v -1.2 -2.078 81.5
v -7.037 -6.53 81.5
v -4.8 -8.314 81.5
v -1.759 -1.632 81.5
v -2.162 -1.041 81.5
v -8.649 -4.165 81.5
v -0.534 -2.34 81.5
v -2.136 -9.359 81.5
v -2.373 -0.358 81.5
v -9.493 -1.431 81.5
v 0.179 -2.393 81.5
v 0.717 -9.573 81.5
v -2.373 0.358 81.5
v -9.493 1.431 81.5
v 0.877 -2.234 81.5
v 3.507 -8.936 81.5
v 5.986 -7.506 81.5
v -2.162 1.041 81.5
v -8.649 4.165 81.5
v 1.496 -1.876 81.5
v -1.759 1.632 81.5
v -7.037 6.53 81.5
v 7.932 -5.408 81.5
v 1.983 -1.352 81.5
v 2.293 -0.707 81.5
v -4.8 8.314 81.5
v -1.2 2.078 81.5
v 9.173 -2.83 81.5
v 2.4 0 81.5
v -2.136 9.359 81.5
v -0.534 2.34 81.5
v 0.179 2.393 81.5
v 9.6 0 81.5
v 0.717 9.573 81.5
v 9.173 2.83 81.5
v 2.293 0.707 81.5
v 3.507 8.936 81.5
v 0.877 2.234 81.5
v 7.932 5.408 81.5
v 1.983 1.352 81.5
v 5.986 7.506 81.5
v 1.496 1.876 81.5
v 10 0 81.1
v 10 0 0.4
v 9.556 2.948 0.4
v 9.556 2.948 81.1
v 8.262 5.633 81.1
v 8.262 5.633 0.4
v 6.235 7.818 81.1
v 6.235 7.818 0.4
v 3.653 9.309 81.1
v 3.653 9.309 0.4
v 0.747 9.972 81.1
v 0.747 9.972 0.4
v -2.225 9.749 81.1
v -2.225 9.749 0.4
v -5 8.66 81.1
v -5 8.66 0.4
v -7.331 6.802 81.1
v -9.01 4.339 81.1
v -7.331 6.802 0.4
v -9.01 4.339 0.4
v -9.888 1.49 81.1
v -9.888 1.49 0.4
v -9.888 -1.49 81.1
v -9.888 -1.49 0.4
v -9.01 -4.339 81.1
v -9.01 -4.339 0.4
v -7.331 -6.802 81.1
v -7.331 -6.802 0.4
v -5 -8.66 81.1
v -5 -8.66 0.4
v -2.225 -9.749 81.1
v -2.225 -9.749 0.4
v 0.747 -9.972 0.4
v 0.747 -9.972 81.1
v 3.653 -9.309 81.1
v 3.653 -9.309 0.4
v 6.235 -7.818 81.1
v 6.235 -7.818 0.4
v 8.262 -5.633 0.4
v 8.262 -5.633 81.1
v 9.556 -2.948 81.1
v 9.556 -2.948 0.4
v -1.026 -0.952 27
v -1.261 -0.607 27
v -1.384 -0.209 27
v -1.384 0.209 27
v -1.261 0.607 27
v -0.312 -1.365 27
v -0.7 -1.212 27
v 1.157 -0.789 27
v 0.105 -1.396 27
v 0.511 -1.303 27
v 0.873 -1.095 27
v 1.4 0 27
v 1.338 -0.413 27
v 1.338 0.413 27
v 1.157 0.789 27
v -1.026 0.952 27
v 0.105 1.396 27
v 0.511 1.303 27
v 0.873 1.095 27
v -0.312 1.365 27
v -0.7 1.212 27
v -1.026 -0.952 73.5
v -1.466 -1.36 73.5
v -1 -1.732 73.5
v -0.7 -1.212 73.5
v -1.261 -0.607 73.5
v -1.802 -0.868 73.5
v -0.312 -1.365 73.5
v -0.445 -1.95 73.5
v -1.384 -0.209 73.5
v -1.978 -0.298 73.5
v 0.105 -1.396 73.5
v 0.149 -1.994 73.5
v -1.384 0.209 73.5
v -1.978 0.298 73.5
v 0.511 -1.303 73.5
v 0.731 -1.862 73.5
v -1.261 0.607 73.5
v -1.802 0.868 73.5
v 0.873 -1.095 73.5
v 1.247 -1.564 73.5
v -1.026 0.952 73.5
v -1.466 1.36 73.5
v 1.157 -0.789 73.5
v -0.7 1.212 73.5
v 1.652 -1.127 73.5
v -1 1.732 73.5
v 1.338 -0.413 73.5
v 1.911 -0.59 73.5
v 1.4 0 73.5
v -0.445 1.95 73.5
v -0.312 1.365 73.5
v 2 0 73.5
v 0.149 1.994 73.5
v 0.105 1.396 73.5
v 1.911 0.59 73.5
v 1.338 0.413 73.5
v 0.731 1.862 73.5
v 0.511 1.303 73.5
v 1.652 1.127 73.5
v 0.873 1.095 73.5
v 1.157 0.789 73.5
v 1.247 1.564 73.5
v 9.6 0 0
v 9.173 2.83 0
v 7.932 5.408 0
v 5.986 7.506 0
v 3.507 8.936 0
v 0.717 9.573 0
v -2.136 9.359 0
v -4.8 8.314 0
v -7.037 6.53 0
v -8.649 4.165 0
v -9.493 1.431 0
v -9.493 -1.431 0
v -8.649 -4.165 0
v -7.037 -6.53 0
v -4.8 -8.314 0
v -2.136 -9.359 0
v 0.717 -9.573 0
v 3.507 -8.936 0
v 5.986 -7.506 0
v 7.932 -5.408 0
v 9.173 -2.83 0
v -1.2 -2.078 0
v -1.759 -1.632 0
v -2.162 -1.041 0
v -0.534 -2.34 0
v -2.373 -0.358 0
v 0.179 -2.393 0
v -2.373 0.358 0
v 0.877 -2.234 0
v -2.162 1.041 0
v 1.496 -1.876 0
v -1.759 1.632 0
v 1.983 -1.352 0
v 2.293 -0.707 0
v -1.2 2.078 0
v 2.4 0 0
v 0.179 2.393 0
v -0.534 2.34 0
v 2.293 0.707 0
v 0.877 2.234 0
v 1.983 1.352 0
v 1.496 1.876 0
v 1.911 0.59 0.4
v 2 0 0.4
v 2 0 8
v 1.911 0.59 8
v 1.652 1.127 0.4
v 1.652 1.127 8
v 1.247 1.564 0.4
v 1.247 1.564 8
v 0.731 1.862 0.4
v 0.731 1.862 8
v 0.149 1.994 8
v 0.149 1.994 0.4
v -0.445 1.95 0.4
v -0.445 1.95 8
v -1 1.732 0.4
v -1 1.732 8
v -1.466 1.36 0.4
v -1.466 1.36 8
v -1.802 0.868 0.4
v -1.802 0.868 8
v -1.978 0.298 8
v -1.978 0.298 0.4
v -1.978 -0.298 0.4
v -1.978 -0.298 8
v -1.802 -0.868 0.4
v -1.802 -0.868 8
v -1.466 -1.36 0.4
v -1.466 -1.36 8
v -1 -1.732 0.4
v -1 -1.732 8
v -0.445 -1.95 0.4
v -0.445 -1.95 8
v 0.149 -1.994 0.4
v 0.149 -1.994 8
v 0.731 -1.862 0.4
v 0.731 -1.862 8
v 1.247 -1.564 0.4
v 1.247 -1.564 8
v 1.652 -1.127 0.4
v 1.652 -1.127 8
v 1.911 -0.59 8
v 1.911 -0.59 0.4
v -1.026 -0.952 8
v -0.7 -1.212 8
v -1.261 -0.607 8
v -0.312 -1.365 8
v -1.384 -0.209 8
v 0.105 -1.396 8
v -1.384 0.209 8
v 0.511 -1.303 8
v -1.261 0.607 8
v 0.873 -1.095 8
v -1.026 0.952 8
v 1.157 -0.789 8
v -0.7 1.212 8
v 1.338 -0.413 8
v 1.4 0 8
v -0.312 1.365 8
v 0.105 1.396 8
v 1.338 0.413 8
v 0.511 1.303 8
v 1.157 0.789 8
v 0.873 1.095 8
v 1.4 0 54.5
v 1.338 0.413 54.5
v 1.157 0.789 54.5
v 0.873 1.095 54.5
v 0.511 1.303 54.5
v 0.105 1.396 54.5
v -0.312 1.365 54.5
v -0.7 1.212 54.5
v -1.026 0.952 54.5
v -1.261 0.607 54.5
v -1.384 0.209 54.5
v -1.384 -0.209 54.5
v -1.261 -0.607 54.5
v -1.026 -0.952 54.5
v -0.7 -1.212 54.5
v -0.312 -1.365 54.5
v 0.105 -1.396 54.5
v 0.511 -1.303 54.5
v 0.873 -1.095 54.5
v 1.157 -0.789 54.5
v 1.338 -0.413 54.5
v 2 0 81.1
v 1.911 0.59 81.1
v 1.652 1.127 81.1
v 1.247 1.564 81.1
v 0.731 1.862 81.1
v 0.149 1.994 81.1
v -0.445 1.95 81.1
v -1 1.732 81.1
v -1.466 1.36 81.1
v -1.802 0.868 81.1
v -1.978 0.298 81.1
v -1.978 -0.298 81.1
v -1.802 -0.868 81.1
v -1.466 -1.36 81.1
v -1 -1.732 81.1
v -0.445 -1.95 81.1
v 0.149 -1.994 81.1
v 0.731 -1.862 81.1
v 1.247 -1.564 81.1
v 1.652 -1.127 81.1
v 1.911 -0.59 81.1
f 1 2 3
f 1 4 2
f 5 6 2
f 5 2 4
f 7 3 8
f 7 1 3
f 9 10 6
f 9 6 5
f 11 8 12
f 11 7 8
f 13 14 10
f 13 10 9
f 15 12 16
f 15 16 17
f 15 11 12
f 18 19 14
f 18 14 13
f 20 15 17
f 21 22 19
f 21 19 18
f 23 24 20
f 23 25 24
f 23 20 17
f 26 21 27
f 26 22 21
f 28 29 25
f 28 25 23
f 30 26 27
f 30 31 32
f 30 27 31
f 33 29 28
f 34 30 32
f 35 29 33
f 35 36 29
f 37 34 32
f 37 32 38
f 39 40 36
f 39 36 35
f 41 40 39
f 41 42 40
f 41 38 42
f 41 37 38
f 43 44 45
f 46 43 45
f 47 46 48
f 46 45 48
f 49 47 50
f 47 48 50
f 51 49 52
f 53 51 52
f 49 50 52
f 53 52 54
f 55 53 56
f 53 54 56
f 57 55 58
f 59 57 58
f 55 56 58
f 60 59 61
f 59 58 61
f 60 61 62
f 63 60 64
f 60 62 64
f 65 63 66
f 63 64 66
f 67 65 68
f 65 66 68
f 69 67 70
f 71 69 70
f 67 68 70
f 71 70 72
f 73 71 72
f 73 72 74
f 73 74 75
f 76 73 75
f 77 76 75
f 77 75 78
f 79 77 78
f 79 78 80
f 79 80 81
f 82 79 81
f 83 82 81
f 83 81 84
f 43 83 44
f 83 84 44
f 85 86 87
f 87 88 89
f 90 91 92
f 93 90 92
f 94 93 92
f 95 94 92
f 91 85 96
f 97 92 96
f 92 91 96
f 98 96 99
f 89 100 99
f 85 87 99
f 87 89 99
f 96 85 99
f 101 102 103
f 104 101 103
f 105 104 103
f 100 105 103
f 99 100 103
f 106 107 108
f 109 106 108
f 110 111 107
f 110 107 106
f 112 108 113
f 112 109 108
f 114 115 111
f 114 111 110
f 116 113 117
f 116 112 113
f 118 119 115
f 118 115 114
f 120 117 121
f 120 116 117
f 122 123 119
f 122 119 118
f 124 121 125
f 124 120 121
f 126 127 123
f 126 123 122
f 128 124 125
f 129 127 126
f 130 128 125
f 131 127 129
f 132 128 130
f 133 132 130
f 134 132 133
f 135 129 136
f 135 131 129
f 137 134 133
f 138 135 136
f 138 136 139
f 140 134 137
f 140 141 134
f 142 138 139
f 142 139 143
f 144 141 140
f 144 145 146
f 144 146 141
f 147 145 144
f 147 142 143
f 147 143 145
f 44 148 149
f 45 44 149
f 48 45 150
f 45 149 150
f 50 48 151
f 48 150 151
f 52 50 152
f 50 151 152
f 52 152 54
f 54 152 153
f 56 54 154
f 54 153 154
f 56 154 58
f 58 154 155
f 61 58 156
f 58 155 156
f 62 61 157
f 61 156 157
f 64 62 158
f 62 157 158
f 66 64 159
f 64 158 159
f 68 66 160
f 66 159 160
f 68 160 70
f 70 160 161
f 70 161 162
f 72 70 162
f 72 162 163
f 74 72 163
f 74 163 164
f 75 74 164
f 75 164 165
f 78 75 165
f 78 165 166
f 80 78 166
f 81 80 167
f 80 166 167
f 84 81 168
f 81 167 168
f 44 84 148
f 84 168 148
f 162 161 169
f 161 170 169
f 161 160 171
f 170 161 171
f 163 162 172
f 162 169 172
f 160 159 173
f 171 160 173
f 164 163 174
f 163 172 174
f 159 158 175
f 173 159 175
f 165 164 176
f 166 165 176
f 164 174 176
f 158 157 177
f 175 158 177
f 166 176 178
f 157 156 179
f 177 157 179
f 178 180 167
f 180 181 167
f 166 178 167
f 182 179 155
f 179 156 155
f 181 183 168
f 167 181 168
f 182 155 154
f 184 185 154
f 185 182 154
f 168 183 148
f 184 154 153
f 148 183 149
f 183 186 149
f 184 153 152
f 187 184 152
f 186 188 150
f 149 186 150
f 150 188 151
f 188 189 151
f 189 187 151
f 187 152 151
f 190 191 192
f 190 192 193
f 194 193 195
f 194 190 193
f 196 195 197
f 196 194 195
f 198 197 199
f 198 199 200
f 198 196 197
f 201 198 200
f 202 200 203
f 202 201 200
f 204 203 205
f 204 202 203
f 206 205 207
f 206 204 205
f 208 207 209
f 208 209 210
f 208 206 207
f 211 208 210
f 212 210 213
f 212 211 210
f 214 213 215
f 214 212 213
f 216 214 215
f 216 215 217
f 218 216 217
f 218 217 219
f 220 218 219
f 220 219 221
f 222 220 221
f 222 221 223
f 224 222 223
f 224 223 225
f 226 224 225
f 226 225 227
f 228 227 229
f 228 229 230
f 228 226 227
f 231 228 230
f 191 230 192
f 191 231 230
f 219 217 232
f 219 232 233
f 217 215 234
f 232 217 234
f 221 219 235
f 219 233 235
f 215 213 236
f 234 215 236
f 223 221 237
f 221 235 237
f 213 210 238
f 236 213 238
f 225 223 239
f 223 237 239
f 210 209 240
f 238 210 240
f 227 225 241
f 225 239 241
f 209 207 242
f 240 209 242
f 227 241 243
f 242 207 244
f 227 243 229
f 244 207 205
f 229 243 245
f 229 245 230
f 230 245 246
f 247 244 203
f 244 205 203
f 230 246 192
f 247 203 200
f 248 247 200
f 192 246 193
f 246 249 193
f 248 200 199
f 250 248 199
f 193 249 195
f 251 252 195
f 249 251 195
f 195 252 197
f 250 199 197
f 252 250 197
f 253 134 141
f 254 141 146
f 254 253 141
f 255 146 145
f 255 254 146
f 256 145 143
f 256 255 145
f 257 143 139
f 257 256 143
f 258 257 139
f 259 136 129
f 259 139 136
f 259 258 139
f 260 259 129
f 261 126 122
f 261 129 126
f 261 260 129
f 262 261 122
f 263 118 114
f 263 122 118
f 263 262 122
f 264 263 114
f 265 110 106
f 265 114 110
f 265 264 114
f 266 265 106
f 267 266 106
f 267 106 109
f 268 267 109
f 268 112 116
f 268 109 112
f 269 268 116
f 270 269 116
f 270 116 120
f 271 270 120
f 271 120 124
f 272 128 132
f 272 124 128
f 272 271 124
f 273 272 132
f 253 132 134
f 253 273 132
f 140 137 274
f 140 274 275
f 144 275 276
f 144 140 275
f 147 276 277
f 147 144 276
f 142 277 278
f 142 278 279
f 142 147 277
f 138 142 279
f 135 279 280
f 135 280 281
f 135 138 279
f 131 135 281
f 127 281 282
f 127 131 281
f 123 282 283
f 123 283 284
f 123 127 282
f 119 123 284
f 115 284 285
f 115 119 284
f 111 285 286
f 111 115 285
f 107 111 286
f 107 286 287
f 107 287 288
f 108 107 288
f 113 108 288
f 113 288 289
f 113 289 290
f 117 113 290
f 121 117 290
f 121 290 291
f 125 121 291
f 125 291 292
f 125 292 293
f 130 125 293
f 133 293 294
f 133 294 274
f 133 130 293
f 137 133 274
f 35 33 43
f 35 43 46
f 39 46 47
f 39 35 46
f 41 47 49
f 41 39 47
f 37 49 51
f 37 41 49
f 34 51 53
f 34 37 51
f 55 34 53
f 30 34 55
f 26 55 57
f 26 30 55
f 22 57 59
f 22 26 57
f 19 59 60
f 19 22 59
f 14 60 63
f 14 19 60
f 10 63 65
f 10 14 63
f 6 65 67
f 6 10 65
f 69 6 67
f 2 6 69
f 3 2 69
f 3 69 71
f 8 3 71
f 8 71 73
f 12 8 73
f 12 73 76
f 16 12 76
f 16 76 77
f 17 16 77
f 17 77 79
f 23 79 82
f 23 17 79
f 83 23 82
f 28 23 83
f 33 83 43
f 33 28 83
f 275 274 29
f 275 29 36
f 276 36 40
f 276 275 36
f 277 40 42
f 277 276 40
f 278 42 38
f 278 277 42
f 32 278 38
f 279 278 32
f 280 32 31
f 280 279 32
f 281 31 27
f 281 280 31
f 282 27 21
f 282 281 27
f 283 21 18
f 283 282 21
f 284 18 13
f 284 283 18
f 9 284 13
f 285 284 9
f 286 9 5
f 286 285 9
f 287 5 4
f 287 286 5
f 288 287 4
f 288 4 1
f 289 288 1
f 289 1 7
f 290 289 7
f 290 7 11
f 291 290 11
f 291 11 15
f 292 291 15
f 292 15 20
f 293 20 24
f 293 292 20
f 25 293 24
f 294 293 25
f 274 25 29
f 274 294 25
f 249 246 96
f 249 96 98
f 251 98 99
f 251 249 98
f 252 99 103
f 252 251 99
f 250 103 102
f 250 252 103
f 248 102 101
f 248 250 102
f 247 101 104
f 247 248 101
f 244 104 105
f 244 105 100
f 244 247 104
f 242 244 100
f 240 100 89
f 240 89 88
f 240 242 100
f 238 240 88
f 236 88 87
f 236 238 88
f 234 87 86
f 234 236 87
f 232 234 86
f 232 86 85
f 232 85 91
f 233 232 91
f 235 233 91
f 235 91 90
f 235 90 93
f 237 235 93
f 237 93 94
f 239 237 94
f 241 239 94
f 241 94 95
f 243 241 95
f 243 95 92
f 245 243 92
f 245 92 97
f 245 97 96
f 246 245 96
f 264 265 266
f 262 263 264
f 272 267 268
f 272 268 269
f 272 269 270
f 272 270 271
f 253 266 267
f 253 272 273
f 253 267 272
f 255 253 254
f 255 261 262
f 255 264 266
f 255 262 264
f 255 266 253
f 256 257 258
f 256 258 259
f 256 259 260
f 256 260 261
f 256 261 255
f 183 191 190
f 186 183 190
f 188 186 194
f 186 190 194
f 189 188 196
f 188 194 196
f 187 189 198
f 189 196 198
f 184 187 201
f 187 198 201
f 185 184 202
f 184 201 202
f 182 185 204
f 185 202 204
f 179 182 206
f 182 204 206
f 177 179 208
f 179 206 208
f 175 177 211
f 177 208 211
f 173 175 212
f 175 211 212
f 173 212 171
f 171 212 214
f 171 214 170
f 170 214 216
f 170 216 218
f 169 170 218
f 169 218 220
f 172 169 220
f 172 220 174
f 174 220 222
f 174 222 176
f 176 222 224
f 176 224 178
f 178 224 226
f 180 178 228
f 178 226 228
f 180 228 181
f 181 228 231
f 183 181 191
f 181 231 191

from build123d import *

# Parameters (mm, degrees)
CYLINDER018_R                              = 1.4
CYLINDER018_DEPTH                          = 27
CYLINDER020_R                              = 2
CYLINDER020_DEPTH                          = 8
CYLINDER021_R                              = 2
CYLINDER021_DEPTH                          = 8
CYLINDER019_R                              = 1.4
CYLINDER019_DEPTH                          = 27
CYLINDER017_R                              = 10
CYLINDER017_DEPTH                          = 81.5
CHAMFER004013007011015006009007001084_SIZE = 0.4


with BuildPart() as cylinder018:
    # Cylinder018 → Cylinder018 (new body)
    with BuildSketch(Plane.XY):
        Circle(CYLINDER018_R)
    extrude(amount=CYLINDER018_DEPTH)


with BuildPart() as cylinder020:
    # Cylinder020 → Cylinder020 (new body)
    with BuildSketch(Plane.XY):
        Circle(CYLINDER020_R)
    extrude(amount=CYLINDER020_DEPTH)


with BuildPart() as cylinder021:
    # Cylinder021 → Cylinder021 (new body)
    with BuildSketch(Plane.XY.offset(73.5)):
        Circle(CYLINDER021_R)
    extrude(amount=CYLINDER021_DEPTH)


with BuildPart() as fusion006002011004053036004001_body:
    # Cylinder019 → Cylinder019 (new body)
    with BuildSketch(Plane.XY.offset(54.5)):
        Circle(CYLINDER019_R)
    extrude(amount=CYLINDER019_DEPTH)

    # Fusion006002011004053036004001028003005014018035002007006012: union Cylinder018, Cylinder020, Cylinder021
    add(cylinder018.part)
    add(cylinder020.part)
    add(cylinder021.part)


with BuildPart() as roller:
    # Cylinder017 → Cylinder017 (new body)
    with BuildSketch(Plane.XY):
        Circle(CYLINDER017_R)
    extrude(amount=CYLINDER017_DEPTH)

    # Cut008004003004014002002005003004003002003021022001002001107: cut Fusion006002011004053036004001 body
    add(fusion006002011004053036004001_body.part, mode=Mode.SUBTRACT)

    # Chamfer004013007011015006009007001084
    chamfer004013007011015006009007001084_edges = [roller.edges().sort_by_distance(p)[0] for p in [
        (-10, 0, 81.5),
        (-10, 0, 0),
        (-2, 0, 81.5),
        (-2, 0, 0),
    ]]
    chamfer(chamfer004013007011015006009007001084_edges, length=CHAMFER004013007011015006009007001084_SIZE)


solid = roller.part
